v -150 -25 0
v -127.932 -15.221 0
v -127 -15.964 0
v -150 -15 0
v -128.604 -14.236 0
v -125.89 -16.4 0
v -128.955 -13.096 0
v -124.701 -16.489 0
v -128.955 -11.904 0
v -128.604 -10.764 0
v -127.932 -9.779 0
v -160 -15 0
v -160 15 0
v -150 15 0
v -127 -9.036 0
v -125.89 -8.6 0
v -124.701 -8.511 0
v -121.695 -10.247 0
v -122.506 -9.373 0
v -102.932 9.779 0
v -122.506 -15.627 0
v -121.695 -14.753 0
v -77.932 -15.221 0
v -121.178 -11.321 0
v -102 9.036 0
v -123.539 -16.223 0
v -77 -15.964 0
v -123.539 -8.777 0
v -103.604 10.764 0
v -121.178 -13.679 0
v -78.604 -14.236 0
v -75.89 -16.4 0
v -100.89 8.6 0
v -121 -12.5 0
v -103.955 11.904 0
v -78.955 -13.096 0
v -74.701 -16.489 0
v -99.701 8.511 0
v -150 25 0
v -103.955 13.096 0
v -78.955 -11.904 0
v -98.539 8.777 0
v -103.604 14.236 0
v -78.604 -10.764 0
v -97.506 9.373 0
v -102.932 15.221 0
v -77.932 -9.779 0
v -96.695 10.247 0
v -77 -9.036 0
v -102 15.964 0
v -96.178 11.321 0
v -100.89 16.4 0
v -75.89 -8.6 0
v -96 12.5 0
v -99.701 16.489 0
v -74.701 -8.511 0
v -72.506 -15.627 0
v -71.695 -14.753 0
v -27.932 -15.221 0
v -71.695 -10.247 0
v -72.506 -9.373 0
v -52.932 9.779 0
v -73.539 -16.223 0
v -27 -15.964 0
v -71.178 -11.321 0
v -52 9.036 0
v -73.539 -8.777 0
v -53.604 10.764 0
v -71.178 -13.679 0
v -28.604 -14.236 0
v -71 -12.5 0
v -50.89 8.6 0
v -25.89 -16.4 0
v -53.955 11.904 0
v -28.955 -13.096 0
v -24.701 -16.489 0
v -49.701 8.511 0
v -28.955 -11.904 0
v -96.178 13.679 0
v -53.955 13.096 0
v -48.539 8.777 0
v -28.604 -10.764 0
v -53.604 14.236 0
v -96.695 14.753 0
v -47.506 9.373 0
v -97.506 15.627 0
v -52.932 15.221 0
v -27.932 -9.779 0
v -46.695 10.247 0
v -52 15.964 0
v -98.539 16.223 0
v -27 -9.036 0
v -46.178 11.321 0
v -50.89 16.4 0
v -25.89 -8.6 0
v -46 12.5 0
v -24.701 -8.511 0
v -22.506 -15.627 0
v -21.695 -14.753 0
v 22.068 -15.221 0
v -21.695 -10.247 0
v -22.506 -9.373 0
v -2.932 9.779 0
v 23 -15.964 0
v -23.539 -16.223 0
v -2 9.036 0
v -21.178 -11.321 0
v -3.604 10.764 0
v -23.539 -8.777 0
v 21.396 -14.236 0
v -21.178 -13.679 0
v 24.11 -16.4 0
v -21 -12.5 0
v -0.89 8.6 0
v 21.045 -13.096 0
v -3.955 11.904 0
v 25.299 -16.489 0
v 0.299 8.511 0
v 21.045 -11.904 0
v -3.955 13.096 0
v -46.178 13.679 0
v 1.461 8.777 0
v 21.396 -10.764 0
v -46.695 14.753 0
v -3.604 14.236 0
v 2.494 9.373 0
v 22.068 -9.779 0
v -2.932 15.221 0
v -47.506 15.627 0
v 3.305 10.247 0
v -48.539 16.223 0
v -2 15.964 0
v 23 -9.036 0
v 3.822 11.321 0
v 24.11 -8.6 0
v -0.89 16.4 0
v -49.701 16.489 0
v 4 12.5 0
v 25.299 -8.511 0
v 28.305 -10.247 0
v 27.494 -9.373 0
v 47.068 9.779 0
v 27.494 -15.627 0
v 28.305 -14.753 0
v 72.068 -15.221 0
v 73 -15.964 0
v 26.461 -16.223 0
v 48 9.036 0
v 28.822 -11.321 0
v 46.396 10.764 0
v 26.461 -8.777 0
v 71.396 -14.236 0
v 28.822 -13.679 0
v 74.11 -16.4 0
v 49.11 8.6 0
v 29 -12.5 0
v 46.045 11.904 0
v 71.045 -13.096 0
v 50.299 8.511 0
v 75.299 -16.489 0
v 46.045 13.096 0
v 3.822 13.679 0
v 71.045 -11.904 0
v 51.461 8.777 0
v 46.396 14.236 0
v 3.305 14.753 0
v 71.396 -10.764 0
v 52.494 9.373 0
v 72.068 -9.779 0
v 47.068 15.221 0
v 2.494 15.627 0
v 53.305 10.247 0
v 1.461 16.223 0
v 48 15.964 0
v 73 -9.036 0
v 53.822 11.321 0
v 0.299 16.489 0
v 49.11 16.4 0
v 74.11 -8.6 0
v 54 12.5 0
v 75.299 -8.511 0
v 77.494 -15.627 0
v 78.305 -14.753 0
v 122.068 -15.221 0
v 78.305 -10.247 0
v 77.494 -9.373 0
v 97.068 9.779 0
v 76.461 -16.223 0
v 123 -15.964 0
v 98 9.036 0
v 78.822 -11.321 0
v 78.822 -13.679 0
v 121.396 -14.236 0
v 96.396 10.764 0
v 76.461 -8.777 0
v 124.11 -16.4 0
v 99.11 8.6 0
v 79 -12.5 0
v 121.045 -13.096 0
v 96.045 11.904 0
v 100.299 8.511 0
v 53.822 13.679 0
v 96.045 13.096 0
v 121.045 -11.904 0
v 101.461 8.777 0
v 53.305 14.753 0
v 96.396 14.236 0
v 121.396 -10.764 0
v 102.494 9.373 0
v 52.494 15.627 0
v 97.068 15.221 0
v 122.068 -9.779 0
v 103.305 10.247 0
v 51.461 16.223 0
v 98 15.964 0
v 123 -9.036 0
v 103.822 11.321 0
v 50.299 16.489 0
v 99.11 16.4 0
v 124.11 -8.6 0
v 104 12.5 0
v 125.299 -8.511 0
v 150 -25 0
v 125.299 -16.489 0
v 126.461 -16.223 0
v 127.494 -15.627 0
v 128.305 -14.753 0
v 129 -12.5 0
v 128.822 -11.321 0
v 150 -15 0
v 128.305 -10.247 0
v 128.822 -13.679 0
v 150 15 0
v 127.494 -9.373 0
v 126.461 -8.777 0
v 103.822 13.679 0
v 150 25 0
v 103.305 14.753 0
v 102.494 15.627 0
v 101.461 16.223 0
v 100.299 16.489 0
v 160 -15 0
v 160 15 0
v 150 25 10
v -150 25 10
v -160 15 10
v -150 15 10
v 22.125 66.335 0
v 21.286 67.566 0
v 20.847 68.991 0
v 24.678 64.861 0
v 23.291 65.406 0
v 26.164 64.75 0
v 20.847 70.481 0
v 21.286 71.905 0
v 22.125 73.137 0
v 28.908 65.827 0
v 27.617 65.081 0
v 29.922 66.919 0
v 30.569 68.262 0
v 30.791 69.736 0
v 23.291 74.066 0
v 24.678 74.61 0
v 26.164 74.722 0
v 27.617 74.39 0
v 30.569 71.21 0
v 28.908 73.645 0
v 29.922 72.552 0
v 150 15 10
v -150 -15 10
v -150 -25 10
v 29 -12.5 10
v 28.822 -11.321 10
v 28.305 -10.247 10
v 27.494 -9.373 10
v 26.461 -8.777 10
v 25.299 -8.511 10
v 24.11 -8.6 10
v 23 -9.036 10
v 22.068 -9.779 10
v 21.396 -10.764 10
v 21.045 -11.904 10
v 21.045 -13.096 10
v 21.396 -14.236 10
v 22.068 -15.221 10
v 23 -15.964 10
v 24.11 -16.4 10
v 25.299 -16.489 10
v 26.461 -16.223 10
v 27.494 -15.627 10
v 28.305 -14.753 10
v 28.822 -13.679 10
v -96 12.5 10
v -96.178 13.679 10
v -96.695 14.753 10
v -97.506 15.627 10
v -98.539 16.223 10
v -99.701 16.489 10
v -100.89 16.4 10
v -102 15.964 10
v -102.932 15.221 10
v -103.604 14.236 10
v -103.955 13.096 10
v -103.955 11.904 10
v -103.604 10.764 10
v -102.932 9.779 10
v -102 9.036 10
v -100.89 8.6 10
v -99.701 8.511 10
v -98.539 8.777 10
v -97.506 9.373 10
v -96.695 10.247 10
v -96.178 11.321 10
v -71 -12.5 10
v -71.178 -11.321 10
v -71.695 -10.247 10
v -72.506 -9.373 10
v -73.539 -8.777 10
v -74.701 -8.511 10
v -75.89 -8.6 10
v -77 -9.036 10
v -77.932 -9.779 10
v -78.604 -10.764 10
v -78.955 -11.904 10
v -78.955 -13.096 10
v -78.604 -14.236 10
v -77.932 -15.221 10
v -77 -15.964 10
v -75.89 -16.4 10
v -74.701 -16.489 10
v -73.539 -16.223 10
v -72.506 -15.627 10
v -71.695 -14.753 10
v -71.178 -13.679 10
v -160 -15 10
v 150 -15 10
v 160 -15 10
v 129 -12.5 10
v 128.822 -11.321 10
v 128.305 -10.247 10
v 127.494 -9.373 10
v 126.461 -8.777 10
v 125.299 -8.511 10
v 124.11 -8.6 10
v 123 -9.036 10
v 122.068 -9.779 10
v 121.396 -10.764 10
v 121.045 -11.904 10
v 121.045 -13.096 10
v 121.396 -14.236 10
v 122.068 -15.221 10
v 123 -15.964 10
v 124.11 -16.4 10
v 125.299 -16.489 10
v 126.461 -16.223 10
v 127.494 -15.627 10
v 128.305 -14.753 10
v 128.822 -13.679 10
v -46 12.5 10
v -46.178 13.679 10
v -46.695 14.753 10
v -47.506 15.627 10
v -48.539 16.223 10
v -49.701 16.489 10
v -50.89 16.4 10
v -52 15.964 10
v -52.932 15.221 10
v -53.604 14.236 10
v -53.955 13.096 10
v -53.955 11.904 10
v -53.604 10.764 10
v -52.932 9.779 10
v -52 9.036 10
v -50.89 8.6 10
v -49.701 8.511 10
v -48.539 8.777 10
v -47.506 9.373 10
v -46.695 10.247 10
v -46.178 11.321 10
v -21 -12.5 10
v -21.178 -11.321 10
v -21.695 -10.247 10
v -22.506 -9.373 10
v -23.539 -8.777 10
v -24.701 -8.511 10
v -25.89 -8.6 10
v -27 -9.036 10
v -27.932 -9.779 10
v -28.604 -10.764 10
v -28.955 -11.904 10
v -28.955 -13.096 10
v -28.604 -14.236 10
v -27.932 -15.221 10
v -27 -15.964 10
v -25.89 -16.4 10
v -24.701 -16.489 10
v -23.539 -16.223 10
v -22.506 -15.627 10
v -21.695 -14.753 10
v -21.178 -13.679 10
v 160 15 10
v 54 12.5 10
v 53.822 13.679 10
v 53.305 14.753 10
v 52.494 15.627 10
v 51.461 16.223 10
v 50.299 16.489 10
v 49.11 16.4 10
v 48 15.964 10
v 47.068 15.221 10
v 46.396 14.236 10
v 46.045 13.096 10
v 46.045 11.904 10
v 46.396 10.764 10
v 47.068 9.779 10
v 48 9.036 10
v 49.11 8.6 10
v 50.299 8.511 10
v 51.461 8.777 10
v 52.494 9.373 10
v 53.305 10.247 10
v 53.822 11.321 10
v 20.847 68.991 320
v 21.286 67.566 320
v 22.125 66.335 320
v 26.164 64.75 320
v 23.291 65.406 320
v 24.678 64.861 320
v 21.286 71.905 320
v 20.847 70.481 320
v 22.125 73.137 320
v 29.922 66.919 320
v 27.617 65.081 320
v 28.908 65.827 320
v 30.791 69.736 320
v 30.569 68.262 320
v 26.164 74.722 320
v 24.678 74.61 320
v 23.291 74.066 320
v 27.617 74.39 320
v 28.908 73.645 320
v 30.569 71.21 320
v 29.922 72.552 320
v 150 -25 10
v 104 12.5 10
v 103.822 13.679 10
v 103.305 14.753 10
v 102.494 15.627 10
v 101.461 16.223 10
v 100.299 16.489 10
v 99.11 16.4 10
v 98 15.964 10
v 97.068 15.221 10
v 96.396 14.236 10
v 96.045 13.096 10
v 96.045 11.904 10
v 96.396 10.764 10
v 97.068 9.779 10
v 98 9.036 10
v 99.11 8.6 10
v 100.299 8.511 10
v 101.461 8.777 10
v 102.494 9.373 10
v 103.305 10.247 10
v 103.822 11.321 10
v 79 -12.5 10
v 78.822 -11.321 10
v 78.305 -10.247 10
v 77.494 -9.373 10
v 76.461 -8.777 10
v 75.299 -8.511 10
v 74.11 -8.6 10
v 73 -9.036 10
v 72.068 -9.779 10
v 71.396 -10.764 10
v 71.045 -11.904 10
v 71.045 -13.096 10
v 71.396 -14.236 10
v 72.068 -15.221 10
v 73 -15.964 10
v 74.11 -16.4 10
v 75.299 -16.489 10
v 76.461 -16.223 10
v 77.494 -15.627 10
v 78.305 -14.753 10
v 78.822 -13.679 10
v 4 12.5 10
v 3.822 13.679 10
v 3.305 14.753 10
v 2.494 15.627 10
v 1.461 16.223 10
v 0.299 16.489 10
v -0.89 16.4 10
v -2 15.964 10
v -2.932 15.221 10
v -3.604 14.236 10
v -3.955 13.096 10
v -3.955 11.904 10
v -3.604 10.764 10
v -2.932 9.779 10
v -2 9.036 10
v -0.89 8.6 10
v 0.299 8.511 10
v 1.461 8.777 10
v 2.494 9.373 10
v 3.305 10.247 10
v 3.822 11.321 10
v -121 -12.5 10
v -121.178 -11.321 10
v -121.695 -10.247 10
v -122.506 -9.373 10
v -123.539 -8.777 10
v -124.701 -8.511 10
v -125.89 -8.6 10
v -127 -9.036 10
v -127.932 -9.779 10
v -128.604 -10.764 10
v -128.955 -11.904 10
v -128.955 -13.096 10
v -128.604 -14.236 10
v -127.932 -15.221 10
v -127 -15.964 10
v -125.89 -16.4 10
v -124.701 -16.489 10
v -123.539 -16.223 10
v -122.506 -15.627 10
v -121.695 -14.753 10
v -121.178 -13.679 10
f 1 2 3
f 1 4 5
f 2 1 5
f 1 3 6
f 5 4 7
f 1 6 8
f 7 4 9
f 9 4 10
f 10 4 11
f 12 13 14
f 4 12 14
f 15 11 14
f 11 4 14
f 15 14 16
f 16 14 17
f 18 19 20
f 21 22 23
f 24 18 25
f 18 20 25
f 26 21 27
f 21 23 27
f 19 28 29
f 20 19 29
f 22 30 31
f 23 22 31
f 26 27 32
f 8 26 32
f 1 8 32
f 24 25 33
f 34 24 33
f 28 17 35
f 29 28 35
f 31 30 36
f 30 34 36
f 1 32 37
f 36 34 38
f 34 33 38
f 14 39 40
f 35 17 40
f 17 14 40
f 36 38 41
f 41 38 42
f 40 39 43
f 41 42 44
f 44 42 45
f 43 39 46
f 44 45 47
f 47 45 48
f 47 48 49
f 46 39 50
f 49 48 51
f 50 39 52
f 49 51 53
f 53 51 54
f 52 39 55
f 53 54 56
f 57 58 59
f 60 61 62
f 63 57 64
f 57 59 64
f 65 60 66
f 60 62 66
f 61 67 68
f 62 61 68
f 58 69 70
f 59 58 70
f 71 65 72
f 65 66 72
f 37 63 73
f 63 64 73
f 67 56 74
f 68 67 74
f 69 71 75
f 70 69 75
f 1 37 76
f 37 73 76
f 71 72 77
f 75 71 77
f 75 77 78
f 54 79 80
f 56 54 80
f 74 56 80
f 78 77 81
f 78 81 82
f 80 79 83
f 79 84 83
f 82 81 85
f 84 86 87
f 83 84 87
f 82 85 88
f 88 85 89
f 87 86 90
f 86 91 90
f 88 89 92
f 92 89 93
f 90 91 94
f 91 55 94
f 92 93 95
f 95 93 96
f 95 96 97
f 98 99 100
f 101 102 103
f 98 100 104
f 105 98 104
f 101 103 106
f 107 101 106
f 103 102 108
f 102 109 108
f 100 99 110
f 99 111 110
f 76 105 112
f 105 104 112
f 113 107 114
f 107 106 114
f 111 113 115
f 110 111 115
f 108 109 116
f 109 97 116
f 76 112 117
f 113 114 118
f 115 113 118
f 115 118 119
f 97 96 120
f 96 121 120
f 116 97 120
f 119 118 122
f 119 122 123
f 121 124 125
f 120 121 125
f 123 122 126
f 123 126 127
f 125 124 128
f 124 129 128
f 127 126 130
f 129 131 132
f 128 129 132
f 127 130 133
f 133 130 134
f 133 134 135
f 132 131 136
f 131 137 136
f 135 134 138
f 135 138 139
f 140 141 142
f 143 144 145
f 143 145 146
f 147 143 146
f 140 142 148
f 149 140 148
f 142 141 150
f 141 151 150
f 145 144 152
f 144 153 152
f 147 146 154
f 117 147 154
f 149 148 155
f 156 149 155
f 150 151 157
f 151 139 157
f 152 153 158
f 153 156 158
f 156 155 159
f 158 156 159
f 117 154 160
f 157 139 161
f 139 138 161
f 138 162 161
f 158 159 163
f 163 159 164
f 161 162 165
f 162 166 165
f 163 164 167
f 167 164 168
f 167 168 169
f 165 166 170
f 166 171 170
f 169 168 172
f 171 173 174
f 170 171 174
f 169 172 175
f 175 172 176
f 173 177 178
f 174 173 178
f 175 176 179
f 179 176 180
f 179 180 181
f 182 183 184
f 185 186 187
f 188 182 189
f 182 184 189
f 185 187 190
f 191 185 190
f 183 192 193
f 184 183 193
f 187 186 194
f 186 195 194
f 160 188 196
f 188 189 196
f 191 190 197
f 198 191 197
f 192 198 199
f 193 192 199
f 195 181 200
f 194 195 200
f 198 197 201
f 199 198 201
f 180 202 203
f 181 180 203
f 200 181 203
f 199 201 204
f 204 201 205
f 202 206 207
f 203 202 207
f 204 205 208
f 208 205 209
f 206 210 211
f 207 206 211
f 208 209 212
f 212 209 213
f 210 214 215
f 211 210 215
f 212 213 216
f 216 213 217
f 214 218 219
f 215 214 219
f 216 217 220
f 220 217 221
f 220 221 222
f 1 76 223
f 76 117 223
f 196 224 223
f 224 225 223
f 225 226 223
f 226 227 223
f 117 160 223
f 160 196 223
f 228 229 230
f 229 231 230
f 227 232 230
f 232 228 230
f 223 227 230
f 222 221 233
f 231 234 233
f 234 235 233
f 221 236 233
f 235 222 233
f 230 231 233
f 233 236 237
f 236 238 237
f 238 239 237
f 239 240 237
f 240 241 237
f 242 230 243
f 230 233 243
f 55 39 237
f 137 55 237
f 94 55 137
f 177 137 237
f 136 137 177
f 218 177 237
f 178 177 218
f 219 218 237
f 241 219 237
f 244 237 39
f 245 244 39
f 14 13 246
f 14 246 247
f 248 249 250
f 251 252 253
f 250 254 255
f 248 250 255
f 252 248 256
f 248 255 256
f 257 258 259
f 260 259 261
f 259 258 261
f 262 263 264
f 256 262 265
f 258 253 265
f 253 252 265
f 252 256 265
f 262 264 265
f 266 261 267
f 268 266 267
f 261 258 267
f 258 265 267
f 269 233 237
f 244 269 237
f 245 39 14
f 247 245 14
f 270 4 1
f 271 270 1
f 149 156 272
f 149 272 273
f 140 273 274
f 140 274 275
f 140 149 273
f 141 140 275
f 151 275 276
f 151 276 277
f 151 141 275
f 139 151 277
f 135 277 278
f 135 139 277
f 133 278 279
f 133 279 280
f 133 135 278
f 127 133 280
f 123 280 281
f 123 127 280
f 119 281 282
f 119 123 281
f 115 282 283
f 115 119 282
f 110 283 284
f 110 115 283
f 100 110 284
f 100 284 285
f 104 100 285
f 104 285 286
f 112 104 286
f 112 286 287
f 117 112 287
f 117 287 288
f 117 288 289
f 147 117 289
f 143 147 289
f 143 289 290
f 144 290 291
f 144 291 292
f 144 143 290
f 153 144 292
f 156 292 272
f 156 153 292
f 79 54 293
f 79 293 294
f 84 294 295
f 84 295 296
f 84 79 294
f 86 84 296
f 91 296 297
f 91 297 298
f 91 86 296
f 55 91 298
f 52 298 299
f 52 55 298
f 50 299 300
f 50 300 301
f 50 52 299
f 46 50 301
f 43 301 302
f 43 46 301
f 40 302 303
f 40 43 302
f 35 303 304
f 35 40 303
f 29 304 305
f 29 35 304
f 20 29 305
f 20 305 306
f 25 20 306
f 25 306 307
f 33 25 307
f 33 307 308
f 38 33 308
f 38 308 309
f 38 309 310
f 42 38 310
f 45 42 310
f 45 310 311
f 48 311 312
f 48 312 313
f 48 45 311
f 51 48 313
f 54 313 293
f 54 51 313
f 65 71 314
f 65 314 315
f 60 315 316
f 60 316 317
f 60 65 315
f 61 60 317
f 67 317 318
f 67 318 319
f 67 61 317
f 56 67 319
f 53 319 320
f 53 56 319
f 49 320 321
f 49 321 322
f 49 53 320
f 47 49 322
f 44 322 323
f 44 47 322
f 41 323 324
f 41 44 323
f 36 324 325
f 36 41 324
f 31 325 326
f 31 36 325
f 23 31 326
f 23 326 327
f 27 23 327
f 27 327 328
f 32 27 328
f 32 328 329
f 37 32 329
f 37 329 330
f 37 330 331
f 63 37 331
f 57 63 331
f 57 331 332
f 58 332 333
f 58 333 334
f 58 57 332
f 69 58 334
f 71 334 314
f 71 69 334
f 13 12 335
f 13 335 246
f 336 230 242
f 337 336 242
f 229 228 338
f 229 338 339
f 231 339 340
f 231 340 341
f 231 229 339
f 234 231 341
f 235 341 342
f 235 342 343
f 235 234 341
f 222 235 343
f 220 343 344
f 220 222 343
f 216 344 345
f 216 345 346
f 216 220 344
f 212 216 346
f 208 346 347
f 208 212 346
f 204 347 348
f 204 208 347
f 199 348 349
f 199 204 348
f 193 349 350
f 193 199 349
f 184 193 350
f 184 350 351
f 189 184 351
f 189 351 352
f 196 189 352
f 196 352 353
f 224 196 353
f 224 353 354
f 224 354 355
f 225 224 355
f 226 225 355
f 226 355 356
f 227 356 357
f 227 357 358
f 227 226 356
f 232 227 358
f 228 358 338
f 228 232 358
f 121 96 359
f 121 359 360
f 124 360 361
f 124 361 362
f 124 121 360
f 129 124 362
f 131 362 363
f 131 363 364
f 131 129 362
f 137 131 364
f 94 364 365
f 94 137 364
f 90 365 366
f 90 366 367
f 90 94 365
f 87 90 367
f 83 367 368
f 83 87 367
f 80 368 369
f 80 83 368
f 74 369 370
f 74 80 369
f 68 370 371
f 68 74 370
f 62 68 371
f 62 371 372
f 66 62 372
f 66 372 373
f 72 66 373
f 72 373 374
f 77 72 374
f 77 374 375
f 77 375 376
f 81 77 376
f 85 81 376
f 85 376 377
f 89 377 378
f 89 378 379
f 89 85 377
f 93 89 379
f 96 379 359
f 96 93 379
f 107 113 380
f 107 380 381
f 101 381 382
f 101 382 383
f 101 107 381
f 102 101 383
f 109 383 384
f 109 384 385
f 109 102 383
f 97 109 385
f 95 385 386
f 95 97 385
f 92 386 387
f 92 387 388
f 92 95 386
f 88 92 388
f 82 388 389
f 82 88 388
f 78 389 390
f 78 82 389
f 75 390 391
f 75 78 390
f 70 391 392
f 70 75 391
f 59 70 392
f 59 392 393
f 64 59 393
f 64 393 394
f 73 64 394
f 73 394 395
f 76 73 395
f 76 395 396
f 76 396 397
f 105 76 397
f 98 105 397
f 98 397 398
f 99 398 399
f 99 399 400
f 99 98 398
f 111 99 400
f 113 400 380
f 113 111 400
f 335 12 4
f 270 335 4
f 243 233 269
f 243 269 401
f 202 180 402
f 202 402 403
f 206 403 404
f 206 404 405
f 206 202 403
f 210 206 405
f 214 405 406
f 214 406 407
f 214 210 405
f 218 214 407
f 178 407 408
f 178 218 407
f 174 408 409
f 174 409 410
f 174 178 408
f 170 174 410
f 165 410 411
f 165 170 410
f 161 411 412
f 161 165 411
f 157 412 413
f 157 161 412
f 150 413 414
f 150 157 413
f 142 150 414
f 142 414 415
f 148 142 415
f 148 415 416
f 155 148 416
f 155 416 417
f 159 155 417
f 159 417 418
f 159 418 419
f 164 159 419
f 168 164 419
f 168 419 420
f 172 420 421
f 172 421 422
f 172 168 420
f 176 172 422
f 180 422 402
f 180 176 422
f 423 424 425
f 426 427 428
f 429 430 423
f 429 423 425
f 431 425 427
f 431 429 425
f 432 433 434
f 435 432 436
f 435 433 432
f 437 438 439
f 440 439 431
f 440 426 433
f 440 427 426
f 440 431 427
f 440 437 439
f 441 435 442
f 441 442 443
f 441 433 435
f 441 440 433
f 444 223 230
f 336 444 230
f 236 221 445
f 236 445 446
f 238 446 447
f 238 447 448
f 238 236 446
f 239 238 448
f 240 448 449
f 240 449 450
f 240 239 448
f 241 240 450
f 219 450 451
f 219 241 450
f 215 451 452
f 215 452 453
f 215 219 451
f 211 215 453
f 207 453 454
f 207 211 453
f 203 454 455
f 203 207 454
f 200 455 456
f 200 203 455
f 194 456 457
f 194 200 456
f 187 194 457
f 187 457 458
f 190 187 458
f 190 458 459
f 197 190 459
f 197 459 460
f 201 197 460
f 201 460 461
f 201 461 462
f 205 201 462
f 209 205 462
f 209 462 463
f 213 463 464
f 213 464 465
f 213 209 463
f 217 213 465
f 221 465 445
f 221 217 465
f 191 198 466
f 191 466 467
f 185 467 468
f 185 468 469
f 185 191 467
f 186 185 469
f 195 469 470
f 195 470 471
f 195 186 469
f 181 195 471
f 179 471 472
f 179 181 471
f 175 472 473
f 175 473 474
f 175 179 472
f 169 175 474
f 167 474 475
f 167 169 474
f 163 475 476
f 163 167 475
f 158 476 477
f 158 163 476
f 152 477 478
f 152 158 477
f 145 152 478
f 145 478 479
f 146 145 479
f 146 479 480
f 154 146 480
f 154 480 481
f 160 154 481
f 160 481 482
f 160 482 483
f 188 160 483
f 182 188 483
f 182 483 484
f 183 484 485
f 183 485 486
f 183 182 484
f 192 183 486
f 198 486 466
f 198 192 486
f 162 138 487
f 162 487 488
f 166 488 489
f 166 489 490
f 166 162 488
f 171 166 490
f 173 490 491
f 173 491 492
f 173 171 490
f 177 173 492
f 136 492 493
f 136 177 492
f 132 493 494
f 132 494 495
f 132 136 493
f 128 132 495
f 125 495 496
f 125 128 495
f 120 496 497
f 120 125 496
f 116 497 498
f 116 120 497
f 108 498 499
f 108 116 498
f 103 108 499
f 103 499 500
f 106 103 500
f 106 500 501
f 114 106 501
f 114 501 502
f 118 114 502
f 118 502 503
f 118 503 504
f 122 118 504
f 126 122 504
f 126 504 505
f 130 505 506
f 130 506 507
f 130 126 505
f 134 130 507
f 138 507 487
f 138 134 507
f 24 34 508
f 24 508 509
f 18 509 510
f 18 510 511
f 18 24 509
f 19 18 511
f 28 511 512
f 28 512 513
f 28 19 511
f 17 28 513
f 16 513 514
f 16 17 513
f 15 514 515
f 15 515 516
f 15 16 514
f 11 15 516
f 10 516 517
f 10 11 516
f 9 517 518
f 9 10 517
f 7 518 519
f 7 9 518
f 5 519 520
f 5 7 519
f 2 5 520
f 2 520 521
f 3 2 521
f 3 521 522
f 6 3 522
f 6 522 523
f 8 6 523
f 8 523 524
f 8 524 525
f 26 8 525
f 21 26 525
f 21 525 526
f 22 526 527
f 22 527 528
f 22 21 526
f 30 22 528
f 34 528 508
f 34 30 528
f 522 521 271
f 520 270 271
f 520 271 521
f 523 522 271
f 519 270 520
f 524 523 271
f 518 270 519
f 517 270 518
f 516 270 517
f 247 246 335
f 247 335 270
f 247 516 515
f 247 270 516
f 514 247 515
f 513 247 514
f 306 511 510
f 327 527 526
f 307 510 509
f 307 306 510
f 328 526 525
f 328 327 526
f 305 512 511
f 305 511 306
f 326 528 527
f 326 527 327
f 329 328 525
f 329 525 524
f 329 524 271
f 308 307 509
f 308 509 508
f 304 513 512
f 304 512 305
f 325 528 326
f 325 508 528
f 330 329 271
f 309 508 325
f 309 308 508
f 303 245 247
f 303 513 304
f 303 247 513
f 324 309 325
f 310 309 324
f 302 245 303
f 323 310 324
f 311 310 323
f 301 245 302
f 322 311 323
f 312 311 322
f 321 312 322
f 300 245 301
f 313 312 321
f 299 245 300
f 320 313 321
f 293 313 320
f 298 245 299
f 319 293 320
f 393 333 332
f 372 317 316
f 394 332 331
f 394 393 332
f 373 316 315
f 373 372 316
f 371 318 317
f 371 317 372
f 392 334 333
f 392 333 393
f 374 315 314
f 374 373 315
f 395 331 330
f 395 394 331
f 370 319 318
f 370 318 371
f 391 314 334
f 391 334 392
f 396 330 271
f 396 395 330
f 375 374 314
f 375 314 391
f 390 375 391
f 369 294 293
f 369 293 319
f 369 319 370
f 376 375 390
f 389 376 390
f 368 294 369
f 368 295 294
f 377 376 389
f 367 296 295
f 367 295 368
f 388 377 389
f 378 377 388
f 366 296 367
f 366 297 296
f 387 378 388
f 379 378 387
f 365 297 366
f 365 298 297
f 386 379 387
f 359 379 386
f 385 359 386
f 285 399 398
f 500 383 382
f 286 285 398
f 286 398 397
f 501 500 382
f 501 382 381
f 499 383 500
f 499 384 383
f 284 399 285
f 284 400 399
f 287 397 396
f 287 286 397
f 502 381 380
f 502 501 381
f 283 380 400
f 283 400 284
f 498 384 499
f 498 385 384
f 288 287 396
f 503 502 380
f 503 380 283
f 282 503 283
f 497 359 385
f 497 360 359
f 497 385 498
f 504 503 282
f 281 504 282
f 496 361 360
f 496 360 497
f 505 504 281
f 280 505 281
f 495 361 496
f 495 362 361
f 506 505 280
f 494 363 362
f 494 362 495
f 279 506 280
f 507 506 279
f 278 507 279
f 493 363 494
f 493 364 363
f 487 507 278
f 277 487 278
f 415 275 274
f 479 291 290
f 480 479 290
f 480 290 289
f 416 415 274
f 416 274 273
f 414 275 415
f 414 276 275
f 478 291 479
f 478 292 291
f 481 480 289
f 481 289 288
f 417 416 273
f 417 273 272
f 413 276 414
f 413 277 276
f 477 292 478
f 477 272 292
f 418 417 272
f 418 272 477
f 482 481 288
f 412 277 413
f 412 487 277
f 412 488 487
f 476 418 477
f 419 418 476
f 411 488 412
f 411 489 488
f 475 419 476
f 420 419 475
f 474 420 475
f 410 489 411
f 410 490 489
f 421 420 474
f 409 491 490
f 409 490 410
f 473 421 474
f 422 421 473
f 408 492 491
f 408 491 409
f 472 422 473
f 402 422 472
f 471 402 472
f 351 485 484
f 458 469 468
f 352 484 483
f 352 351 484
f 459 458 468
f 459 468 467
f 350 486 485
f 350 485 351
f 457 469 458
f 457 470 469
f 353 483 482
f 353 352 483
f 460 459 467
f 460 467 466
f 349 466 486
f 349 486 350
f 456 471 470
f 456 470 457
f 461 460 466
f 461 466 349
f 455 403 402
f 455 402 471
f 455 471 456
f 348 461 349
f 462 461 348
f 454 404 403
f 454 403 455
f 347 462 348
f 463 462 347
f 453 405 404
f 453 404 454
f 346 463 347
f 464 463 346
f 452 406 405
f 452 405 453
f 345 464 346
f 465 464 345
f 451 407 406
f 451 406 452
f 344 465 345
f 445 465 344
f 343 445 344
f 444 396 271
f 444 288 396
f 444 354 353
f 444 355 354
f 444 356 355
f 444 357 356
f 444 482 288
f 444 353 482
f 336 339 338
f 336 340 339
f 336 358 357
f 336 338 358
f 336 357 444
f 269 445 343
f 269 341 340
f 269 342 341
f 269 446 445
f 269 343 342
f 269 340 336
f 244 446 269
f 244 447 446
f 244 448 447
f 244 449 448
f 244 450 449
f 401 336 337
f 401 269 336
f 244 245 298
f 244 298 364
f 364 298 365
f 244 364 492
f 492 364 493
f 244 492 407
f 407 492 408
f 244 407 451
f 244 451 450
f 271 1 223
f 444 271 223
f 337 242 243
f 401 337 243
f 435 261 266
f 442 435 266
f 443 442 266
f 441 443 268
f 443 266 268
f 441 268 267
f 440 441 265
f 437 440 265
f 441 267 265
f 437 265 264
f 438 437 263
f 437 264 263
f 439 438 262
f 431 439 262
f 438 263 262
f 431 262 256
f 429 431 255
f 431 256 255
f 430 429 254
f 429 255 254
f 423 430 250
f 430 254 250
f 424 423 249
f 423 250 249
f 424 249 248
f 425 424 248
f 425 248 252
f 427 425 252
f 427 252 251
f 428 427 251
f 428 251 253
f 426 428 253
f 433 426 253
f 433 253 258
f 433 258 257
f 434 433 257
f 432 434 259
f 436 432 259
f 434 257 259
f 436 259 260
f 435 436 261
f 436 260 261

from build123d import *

# Parameters (mm, degrees)
F0_W     = 10
F0_H     = 30
F0_R     = 4
F1_DEPTH = 10
F2_R     = 5
F3_DEPTH = 320


with BuildPart() as f1:
    # F0 (on Top) → F1 (new body)
    with BuildSketch(Plane.XY):
        with Locations((155, 0)):
            Rectangle(F0_W, F0_H)
        with Locations((-155, 0)):
            Rectangle(F0_W, F0_H)
        Polygon((-150, -25), (150, -25), (150, -15), (150, 15), (150, 25), (-150, 25), (-150, 15), (-150, -15), align=None)
        with Locations((-125, -12.5)):
            Circle(F0_R, mode=Mode.SUBTRACT)
        with Locations((-75, -12.5)):
            Circle(F0_R, mode=Mode.SUBTRACT)
        with Locations((-25, -12.5)):
            Circle(F0_R, mode=Mode.SUBTRACT)
        with Locations((25, -12.5)):
            Circle(F0_R, mode=Mode.SUBTRACT)
        with Locations((75, -12.5)):
            Circle(F0_R, mode=Mode.SUBTRACT)
        with Locations((125, -12.5)):
            Circle(F0_R, mode=Mode.SUBTRACT)
        with Locations((-100, 12.5)):
            Circle(F0_R, mode=Mode.SUBTRACT)
        with Locations((-50, 12.5)):
            Circle(F0_R, mode=Mode.SUBTRACT)
        with Locations((0, 12.5)):
            Circle(F0_R, mode=Mode.SUBTRACT)
        with Locations((50, 12.5)):
            Circle(F0_R, mode=Mode.SUBTRACT)
        with Locations((100, 12.5)):
            Circle(F0_R, mode=Mode.SUBTRACT)
    extrude(amount=F1_DEPTH)


with BuildPart() as f3:
    # F2 (on Top) → F3 (new body)
    with BuildSketch(Plane.XY):
        with Locations((25.790736, 69.735847)):
            Circle(F2_R)
    extrude(amount=F3_DEPTH)


solid = Compound([f1.part, f3.part])
